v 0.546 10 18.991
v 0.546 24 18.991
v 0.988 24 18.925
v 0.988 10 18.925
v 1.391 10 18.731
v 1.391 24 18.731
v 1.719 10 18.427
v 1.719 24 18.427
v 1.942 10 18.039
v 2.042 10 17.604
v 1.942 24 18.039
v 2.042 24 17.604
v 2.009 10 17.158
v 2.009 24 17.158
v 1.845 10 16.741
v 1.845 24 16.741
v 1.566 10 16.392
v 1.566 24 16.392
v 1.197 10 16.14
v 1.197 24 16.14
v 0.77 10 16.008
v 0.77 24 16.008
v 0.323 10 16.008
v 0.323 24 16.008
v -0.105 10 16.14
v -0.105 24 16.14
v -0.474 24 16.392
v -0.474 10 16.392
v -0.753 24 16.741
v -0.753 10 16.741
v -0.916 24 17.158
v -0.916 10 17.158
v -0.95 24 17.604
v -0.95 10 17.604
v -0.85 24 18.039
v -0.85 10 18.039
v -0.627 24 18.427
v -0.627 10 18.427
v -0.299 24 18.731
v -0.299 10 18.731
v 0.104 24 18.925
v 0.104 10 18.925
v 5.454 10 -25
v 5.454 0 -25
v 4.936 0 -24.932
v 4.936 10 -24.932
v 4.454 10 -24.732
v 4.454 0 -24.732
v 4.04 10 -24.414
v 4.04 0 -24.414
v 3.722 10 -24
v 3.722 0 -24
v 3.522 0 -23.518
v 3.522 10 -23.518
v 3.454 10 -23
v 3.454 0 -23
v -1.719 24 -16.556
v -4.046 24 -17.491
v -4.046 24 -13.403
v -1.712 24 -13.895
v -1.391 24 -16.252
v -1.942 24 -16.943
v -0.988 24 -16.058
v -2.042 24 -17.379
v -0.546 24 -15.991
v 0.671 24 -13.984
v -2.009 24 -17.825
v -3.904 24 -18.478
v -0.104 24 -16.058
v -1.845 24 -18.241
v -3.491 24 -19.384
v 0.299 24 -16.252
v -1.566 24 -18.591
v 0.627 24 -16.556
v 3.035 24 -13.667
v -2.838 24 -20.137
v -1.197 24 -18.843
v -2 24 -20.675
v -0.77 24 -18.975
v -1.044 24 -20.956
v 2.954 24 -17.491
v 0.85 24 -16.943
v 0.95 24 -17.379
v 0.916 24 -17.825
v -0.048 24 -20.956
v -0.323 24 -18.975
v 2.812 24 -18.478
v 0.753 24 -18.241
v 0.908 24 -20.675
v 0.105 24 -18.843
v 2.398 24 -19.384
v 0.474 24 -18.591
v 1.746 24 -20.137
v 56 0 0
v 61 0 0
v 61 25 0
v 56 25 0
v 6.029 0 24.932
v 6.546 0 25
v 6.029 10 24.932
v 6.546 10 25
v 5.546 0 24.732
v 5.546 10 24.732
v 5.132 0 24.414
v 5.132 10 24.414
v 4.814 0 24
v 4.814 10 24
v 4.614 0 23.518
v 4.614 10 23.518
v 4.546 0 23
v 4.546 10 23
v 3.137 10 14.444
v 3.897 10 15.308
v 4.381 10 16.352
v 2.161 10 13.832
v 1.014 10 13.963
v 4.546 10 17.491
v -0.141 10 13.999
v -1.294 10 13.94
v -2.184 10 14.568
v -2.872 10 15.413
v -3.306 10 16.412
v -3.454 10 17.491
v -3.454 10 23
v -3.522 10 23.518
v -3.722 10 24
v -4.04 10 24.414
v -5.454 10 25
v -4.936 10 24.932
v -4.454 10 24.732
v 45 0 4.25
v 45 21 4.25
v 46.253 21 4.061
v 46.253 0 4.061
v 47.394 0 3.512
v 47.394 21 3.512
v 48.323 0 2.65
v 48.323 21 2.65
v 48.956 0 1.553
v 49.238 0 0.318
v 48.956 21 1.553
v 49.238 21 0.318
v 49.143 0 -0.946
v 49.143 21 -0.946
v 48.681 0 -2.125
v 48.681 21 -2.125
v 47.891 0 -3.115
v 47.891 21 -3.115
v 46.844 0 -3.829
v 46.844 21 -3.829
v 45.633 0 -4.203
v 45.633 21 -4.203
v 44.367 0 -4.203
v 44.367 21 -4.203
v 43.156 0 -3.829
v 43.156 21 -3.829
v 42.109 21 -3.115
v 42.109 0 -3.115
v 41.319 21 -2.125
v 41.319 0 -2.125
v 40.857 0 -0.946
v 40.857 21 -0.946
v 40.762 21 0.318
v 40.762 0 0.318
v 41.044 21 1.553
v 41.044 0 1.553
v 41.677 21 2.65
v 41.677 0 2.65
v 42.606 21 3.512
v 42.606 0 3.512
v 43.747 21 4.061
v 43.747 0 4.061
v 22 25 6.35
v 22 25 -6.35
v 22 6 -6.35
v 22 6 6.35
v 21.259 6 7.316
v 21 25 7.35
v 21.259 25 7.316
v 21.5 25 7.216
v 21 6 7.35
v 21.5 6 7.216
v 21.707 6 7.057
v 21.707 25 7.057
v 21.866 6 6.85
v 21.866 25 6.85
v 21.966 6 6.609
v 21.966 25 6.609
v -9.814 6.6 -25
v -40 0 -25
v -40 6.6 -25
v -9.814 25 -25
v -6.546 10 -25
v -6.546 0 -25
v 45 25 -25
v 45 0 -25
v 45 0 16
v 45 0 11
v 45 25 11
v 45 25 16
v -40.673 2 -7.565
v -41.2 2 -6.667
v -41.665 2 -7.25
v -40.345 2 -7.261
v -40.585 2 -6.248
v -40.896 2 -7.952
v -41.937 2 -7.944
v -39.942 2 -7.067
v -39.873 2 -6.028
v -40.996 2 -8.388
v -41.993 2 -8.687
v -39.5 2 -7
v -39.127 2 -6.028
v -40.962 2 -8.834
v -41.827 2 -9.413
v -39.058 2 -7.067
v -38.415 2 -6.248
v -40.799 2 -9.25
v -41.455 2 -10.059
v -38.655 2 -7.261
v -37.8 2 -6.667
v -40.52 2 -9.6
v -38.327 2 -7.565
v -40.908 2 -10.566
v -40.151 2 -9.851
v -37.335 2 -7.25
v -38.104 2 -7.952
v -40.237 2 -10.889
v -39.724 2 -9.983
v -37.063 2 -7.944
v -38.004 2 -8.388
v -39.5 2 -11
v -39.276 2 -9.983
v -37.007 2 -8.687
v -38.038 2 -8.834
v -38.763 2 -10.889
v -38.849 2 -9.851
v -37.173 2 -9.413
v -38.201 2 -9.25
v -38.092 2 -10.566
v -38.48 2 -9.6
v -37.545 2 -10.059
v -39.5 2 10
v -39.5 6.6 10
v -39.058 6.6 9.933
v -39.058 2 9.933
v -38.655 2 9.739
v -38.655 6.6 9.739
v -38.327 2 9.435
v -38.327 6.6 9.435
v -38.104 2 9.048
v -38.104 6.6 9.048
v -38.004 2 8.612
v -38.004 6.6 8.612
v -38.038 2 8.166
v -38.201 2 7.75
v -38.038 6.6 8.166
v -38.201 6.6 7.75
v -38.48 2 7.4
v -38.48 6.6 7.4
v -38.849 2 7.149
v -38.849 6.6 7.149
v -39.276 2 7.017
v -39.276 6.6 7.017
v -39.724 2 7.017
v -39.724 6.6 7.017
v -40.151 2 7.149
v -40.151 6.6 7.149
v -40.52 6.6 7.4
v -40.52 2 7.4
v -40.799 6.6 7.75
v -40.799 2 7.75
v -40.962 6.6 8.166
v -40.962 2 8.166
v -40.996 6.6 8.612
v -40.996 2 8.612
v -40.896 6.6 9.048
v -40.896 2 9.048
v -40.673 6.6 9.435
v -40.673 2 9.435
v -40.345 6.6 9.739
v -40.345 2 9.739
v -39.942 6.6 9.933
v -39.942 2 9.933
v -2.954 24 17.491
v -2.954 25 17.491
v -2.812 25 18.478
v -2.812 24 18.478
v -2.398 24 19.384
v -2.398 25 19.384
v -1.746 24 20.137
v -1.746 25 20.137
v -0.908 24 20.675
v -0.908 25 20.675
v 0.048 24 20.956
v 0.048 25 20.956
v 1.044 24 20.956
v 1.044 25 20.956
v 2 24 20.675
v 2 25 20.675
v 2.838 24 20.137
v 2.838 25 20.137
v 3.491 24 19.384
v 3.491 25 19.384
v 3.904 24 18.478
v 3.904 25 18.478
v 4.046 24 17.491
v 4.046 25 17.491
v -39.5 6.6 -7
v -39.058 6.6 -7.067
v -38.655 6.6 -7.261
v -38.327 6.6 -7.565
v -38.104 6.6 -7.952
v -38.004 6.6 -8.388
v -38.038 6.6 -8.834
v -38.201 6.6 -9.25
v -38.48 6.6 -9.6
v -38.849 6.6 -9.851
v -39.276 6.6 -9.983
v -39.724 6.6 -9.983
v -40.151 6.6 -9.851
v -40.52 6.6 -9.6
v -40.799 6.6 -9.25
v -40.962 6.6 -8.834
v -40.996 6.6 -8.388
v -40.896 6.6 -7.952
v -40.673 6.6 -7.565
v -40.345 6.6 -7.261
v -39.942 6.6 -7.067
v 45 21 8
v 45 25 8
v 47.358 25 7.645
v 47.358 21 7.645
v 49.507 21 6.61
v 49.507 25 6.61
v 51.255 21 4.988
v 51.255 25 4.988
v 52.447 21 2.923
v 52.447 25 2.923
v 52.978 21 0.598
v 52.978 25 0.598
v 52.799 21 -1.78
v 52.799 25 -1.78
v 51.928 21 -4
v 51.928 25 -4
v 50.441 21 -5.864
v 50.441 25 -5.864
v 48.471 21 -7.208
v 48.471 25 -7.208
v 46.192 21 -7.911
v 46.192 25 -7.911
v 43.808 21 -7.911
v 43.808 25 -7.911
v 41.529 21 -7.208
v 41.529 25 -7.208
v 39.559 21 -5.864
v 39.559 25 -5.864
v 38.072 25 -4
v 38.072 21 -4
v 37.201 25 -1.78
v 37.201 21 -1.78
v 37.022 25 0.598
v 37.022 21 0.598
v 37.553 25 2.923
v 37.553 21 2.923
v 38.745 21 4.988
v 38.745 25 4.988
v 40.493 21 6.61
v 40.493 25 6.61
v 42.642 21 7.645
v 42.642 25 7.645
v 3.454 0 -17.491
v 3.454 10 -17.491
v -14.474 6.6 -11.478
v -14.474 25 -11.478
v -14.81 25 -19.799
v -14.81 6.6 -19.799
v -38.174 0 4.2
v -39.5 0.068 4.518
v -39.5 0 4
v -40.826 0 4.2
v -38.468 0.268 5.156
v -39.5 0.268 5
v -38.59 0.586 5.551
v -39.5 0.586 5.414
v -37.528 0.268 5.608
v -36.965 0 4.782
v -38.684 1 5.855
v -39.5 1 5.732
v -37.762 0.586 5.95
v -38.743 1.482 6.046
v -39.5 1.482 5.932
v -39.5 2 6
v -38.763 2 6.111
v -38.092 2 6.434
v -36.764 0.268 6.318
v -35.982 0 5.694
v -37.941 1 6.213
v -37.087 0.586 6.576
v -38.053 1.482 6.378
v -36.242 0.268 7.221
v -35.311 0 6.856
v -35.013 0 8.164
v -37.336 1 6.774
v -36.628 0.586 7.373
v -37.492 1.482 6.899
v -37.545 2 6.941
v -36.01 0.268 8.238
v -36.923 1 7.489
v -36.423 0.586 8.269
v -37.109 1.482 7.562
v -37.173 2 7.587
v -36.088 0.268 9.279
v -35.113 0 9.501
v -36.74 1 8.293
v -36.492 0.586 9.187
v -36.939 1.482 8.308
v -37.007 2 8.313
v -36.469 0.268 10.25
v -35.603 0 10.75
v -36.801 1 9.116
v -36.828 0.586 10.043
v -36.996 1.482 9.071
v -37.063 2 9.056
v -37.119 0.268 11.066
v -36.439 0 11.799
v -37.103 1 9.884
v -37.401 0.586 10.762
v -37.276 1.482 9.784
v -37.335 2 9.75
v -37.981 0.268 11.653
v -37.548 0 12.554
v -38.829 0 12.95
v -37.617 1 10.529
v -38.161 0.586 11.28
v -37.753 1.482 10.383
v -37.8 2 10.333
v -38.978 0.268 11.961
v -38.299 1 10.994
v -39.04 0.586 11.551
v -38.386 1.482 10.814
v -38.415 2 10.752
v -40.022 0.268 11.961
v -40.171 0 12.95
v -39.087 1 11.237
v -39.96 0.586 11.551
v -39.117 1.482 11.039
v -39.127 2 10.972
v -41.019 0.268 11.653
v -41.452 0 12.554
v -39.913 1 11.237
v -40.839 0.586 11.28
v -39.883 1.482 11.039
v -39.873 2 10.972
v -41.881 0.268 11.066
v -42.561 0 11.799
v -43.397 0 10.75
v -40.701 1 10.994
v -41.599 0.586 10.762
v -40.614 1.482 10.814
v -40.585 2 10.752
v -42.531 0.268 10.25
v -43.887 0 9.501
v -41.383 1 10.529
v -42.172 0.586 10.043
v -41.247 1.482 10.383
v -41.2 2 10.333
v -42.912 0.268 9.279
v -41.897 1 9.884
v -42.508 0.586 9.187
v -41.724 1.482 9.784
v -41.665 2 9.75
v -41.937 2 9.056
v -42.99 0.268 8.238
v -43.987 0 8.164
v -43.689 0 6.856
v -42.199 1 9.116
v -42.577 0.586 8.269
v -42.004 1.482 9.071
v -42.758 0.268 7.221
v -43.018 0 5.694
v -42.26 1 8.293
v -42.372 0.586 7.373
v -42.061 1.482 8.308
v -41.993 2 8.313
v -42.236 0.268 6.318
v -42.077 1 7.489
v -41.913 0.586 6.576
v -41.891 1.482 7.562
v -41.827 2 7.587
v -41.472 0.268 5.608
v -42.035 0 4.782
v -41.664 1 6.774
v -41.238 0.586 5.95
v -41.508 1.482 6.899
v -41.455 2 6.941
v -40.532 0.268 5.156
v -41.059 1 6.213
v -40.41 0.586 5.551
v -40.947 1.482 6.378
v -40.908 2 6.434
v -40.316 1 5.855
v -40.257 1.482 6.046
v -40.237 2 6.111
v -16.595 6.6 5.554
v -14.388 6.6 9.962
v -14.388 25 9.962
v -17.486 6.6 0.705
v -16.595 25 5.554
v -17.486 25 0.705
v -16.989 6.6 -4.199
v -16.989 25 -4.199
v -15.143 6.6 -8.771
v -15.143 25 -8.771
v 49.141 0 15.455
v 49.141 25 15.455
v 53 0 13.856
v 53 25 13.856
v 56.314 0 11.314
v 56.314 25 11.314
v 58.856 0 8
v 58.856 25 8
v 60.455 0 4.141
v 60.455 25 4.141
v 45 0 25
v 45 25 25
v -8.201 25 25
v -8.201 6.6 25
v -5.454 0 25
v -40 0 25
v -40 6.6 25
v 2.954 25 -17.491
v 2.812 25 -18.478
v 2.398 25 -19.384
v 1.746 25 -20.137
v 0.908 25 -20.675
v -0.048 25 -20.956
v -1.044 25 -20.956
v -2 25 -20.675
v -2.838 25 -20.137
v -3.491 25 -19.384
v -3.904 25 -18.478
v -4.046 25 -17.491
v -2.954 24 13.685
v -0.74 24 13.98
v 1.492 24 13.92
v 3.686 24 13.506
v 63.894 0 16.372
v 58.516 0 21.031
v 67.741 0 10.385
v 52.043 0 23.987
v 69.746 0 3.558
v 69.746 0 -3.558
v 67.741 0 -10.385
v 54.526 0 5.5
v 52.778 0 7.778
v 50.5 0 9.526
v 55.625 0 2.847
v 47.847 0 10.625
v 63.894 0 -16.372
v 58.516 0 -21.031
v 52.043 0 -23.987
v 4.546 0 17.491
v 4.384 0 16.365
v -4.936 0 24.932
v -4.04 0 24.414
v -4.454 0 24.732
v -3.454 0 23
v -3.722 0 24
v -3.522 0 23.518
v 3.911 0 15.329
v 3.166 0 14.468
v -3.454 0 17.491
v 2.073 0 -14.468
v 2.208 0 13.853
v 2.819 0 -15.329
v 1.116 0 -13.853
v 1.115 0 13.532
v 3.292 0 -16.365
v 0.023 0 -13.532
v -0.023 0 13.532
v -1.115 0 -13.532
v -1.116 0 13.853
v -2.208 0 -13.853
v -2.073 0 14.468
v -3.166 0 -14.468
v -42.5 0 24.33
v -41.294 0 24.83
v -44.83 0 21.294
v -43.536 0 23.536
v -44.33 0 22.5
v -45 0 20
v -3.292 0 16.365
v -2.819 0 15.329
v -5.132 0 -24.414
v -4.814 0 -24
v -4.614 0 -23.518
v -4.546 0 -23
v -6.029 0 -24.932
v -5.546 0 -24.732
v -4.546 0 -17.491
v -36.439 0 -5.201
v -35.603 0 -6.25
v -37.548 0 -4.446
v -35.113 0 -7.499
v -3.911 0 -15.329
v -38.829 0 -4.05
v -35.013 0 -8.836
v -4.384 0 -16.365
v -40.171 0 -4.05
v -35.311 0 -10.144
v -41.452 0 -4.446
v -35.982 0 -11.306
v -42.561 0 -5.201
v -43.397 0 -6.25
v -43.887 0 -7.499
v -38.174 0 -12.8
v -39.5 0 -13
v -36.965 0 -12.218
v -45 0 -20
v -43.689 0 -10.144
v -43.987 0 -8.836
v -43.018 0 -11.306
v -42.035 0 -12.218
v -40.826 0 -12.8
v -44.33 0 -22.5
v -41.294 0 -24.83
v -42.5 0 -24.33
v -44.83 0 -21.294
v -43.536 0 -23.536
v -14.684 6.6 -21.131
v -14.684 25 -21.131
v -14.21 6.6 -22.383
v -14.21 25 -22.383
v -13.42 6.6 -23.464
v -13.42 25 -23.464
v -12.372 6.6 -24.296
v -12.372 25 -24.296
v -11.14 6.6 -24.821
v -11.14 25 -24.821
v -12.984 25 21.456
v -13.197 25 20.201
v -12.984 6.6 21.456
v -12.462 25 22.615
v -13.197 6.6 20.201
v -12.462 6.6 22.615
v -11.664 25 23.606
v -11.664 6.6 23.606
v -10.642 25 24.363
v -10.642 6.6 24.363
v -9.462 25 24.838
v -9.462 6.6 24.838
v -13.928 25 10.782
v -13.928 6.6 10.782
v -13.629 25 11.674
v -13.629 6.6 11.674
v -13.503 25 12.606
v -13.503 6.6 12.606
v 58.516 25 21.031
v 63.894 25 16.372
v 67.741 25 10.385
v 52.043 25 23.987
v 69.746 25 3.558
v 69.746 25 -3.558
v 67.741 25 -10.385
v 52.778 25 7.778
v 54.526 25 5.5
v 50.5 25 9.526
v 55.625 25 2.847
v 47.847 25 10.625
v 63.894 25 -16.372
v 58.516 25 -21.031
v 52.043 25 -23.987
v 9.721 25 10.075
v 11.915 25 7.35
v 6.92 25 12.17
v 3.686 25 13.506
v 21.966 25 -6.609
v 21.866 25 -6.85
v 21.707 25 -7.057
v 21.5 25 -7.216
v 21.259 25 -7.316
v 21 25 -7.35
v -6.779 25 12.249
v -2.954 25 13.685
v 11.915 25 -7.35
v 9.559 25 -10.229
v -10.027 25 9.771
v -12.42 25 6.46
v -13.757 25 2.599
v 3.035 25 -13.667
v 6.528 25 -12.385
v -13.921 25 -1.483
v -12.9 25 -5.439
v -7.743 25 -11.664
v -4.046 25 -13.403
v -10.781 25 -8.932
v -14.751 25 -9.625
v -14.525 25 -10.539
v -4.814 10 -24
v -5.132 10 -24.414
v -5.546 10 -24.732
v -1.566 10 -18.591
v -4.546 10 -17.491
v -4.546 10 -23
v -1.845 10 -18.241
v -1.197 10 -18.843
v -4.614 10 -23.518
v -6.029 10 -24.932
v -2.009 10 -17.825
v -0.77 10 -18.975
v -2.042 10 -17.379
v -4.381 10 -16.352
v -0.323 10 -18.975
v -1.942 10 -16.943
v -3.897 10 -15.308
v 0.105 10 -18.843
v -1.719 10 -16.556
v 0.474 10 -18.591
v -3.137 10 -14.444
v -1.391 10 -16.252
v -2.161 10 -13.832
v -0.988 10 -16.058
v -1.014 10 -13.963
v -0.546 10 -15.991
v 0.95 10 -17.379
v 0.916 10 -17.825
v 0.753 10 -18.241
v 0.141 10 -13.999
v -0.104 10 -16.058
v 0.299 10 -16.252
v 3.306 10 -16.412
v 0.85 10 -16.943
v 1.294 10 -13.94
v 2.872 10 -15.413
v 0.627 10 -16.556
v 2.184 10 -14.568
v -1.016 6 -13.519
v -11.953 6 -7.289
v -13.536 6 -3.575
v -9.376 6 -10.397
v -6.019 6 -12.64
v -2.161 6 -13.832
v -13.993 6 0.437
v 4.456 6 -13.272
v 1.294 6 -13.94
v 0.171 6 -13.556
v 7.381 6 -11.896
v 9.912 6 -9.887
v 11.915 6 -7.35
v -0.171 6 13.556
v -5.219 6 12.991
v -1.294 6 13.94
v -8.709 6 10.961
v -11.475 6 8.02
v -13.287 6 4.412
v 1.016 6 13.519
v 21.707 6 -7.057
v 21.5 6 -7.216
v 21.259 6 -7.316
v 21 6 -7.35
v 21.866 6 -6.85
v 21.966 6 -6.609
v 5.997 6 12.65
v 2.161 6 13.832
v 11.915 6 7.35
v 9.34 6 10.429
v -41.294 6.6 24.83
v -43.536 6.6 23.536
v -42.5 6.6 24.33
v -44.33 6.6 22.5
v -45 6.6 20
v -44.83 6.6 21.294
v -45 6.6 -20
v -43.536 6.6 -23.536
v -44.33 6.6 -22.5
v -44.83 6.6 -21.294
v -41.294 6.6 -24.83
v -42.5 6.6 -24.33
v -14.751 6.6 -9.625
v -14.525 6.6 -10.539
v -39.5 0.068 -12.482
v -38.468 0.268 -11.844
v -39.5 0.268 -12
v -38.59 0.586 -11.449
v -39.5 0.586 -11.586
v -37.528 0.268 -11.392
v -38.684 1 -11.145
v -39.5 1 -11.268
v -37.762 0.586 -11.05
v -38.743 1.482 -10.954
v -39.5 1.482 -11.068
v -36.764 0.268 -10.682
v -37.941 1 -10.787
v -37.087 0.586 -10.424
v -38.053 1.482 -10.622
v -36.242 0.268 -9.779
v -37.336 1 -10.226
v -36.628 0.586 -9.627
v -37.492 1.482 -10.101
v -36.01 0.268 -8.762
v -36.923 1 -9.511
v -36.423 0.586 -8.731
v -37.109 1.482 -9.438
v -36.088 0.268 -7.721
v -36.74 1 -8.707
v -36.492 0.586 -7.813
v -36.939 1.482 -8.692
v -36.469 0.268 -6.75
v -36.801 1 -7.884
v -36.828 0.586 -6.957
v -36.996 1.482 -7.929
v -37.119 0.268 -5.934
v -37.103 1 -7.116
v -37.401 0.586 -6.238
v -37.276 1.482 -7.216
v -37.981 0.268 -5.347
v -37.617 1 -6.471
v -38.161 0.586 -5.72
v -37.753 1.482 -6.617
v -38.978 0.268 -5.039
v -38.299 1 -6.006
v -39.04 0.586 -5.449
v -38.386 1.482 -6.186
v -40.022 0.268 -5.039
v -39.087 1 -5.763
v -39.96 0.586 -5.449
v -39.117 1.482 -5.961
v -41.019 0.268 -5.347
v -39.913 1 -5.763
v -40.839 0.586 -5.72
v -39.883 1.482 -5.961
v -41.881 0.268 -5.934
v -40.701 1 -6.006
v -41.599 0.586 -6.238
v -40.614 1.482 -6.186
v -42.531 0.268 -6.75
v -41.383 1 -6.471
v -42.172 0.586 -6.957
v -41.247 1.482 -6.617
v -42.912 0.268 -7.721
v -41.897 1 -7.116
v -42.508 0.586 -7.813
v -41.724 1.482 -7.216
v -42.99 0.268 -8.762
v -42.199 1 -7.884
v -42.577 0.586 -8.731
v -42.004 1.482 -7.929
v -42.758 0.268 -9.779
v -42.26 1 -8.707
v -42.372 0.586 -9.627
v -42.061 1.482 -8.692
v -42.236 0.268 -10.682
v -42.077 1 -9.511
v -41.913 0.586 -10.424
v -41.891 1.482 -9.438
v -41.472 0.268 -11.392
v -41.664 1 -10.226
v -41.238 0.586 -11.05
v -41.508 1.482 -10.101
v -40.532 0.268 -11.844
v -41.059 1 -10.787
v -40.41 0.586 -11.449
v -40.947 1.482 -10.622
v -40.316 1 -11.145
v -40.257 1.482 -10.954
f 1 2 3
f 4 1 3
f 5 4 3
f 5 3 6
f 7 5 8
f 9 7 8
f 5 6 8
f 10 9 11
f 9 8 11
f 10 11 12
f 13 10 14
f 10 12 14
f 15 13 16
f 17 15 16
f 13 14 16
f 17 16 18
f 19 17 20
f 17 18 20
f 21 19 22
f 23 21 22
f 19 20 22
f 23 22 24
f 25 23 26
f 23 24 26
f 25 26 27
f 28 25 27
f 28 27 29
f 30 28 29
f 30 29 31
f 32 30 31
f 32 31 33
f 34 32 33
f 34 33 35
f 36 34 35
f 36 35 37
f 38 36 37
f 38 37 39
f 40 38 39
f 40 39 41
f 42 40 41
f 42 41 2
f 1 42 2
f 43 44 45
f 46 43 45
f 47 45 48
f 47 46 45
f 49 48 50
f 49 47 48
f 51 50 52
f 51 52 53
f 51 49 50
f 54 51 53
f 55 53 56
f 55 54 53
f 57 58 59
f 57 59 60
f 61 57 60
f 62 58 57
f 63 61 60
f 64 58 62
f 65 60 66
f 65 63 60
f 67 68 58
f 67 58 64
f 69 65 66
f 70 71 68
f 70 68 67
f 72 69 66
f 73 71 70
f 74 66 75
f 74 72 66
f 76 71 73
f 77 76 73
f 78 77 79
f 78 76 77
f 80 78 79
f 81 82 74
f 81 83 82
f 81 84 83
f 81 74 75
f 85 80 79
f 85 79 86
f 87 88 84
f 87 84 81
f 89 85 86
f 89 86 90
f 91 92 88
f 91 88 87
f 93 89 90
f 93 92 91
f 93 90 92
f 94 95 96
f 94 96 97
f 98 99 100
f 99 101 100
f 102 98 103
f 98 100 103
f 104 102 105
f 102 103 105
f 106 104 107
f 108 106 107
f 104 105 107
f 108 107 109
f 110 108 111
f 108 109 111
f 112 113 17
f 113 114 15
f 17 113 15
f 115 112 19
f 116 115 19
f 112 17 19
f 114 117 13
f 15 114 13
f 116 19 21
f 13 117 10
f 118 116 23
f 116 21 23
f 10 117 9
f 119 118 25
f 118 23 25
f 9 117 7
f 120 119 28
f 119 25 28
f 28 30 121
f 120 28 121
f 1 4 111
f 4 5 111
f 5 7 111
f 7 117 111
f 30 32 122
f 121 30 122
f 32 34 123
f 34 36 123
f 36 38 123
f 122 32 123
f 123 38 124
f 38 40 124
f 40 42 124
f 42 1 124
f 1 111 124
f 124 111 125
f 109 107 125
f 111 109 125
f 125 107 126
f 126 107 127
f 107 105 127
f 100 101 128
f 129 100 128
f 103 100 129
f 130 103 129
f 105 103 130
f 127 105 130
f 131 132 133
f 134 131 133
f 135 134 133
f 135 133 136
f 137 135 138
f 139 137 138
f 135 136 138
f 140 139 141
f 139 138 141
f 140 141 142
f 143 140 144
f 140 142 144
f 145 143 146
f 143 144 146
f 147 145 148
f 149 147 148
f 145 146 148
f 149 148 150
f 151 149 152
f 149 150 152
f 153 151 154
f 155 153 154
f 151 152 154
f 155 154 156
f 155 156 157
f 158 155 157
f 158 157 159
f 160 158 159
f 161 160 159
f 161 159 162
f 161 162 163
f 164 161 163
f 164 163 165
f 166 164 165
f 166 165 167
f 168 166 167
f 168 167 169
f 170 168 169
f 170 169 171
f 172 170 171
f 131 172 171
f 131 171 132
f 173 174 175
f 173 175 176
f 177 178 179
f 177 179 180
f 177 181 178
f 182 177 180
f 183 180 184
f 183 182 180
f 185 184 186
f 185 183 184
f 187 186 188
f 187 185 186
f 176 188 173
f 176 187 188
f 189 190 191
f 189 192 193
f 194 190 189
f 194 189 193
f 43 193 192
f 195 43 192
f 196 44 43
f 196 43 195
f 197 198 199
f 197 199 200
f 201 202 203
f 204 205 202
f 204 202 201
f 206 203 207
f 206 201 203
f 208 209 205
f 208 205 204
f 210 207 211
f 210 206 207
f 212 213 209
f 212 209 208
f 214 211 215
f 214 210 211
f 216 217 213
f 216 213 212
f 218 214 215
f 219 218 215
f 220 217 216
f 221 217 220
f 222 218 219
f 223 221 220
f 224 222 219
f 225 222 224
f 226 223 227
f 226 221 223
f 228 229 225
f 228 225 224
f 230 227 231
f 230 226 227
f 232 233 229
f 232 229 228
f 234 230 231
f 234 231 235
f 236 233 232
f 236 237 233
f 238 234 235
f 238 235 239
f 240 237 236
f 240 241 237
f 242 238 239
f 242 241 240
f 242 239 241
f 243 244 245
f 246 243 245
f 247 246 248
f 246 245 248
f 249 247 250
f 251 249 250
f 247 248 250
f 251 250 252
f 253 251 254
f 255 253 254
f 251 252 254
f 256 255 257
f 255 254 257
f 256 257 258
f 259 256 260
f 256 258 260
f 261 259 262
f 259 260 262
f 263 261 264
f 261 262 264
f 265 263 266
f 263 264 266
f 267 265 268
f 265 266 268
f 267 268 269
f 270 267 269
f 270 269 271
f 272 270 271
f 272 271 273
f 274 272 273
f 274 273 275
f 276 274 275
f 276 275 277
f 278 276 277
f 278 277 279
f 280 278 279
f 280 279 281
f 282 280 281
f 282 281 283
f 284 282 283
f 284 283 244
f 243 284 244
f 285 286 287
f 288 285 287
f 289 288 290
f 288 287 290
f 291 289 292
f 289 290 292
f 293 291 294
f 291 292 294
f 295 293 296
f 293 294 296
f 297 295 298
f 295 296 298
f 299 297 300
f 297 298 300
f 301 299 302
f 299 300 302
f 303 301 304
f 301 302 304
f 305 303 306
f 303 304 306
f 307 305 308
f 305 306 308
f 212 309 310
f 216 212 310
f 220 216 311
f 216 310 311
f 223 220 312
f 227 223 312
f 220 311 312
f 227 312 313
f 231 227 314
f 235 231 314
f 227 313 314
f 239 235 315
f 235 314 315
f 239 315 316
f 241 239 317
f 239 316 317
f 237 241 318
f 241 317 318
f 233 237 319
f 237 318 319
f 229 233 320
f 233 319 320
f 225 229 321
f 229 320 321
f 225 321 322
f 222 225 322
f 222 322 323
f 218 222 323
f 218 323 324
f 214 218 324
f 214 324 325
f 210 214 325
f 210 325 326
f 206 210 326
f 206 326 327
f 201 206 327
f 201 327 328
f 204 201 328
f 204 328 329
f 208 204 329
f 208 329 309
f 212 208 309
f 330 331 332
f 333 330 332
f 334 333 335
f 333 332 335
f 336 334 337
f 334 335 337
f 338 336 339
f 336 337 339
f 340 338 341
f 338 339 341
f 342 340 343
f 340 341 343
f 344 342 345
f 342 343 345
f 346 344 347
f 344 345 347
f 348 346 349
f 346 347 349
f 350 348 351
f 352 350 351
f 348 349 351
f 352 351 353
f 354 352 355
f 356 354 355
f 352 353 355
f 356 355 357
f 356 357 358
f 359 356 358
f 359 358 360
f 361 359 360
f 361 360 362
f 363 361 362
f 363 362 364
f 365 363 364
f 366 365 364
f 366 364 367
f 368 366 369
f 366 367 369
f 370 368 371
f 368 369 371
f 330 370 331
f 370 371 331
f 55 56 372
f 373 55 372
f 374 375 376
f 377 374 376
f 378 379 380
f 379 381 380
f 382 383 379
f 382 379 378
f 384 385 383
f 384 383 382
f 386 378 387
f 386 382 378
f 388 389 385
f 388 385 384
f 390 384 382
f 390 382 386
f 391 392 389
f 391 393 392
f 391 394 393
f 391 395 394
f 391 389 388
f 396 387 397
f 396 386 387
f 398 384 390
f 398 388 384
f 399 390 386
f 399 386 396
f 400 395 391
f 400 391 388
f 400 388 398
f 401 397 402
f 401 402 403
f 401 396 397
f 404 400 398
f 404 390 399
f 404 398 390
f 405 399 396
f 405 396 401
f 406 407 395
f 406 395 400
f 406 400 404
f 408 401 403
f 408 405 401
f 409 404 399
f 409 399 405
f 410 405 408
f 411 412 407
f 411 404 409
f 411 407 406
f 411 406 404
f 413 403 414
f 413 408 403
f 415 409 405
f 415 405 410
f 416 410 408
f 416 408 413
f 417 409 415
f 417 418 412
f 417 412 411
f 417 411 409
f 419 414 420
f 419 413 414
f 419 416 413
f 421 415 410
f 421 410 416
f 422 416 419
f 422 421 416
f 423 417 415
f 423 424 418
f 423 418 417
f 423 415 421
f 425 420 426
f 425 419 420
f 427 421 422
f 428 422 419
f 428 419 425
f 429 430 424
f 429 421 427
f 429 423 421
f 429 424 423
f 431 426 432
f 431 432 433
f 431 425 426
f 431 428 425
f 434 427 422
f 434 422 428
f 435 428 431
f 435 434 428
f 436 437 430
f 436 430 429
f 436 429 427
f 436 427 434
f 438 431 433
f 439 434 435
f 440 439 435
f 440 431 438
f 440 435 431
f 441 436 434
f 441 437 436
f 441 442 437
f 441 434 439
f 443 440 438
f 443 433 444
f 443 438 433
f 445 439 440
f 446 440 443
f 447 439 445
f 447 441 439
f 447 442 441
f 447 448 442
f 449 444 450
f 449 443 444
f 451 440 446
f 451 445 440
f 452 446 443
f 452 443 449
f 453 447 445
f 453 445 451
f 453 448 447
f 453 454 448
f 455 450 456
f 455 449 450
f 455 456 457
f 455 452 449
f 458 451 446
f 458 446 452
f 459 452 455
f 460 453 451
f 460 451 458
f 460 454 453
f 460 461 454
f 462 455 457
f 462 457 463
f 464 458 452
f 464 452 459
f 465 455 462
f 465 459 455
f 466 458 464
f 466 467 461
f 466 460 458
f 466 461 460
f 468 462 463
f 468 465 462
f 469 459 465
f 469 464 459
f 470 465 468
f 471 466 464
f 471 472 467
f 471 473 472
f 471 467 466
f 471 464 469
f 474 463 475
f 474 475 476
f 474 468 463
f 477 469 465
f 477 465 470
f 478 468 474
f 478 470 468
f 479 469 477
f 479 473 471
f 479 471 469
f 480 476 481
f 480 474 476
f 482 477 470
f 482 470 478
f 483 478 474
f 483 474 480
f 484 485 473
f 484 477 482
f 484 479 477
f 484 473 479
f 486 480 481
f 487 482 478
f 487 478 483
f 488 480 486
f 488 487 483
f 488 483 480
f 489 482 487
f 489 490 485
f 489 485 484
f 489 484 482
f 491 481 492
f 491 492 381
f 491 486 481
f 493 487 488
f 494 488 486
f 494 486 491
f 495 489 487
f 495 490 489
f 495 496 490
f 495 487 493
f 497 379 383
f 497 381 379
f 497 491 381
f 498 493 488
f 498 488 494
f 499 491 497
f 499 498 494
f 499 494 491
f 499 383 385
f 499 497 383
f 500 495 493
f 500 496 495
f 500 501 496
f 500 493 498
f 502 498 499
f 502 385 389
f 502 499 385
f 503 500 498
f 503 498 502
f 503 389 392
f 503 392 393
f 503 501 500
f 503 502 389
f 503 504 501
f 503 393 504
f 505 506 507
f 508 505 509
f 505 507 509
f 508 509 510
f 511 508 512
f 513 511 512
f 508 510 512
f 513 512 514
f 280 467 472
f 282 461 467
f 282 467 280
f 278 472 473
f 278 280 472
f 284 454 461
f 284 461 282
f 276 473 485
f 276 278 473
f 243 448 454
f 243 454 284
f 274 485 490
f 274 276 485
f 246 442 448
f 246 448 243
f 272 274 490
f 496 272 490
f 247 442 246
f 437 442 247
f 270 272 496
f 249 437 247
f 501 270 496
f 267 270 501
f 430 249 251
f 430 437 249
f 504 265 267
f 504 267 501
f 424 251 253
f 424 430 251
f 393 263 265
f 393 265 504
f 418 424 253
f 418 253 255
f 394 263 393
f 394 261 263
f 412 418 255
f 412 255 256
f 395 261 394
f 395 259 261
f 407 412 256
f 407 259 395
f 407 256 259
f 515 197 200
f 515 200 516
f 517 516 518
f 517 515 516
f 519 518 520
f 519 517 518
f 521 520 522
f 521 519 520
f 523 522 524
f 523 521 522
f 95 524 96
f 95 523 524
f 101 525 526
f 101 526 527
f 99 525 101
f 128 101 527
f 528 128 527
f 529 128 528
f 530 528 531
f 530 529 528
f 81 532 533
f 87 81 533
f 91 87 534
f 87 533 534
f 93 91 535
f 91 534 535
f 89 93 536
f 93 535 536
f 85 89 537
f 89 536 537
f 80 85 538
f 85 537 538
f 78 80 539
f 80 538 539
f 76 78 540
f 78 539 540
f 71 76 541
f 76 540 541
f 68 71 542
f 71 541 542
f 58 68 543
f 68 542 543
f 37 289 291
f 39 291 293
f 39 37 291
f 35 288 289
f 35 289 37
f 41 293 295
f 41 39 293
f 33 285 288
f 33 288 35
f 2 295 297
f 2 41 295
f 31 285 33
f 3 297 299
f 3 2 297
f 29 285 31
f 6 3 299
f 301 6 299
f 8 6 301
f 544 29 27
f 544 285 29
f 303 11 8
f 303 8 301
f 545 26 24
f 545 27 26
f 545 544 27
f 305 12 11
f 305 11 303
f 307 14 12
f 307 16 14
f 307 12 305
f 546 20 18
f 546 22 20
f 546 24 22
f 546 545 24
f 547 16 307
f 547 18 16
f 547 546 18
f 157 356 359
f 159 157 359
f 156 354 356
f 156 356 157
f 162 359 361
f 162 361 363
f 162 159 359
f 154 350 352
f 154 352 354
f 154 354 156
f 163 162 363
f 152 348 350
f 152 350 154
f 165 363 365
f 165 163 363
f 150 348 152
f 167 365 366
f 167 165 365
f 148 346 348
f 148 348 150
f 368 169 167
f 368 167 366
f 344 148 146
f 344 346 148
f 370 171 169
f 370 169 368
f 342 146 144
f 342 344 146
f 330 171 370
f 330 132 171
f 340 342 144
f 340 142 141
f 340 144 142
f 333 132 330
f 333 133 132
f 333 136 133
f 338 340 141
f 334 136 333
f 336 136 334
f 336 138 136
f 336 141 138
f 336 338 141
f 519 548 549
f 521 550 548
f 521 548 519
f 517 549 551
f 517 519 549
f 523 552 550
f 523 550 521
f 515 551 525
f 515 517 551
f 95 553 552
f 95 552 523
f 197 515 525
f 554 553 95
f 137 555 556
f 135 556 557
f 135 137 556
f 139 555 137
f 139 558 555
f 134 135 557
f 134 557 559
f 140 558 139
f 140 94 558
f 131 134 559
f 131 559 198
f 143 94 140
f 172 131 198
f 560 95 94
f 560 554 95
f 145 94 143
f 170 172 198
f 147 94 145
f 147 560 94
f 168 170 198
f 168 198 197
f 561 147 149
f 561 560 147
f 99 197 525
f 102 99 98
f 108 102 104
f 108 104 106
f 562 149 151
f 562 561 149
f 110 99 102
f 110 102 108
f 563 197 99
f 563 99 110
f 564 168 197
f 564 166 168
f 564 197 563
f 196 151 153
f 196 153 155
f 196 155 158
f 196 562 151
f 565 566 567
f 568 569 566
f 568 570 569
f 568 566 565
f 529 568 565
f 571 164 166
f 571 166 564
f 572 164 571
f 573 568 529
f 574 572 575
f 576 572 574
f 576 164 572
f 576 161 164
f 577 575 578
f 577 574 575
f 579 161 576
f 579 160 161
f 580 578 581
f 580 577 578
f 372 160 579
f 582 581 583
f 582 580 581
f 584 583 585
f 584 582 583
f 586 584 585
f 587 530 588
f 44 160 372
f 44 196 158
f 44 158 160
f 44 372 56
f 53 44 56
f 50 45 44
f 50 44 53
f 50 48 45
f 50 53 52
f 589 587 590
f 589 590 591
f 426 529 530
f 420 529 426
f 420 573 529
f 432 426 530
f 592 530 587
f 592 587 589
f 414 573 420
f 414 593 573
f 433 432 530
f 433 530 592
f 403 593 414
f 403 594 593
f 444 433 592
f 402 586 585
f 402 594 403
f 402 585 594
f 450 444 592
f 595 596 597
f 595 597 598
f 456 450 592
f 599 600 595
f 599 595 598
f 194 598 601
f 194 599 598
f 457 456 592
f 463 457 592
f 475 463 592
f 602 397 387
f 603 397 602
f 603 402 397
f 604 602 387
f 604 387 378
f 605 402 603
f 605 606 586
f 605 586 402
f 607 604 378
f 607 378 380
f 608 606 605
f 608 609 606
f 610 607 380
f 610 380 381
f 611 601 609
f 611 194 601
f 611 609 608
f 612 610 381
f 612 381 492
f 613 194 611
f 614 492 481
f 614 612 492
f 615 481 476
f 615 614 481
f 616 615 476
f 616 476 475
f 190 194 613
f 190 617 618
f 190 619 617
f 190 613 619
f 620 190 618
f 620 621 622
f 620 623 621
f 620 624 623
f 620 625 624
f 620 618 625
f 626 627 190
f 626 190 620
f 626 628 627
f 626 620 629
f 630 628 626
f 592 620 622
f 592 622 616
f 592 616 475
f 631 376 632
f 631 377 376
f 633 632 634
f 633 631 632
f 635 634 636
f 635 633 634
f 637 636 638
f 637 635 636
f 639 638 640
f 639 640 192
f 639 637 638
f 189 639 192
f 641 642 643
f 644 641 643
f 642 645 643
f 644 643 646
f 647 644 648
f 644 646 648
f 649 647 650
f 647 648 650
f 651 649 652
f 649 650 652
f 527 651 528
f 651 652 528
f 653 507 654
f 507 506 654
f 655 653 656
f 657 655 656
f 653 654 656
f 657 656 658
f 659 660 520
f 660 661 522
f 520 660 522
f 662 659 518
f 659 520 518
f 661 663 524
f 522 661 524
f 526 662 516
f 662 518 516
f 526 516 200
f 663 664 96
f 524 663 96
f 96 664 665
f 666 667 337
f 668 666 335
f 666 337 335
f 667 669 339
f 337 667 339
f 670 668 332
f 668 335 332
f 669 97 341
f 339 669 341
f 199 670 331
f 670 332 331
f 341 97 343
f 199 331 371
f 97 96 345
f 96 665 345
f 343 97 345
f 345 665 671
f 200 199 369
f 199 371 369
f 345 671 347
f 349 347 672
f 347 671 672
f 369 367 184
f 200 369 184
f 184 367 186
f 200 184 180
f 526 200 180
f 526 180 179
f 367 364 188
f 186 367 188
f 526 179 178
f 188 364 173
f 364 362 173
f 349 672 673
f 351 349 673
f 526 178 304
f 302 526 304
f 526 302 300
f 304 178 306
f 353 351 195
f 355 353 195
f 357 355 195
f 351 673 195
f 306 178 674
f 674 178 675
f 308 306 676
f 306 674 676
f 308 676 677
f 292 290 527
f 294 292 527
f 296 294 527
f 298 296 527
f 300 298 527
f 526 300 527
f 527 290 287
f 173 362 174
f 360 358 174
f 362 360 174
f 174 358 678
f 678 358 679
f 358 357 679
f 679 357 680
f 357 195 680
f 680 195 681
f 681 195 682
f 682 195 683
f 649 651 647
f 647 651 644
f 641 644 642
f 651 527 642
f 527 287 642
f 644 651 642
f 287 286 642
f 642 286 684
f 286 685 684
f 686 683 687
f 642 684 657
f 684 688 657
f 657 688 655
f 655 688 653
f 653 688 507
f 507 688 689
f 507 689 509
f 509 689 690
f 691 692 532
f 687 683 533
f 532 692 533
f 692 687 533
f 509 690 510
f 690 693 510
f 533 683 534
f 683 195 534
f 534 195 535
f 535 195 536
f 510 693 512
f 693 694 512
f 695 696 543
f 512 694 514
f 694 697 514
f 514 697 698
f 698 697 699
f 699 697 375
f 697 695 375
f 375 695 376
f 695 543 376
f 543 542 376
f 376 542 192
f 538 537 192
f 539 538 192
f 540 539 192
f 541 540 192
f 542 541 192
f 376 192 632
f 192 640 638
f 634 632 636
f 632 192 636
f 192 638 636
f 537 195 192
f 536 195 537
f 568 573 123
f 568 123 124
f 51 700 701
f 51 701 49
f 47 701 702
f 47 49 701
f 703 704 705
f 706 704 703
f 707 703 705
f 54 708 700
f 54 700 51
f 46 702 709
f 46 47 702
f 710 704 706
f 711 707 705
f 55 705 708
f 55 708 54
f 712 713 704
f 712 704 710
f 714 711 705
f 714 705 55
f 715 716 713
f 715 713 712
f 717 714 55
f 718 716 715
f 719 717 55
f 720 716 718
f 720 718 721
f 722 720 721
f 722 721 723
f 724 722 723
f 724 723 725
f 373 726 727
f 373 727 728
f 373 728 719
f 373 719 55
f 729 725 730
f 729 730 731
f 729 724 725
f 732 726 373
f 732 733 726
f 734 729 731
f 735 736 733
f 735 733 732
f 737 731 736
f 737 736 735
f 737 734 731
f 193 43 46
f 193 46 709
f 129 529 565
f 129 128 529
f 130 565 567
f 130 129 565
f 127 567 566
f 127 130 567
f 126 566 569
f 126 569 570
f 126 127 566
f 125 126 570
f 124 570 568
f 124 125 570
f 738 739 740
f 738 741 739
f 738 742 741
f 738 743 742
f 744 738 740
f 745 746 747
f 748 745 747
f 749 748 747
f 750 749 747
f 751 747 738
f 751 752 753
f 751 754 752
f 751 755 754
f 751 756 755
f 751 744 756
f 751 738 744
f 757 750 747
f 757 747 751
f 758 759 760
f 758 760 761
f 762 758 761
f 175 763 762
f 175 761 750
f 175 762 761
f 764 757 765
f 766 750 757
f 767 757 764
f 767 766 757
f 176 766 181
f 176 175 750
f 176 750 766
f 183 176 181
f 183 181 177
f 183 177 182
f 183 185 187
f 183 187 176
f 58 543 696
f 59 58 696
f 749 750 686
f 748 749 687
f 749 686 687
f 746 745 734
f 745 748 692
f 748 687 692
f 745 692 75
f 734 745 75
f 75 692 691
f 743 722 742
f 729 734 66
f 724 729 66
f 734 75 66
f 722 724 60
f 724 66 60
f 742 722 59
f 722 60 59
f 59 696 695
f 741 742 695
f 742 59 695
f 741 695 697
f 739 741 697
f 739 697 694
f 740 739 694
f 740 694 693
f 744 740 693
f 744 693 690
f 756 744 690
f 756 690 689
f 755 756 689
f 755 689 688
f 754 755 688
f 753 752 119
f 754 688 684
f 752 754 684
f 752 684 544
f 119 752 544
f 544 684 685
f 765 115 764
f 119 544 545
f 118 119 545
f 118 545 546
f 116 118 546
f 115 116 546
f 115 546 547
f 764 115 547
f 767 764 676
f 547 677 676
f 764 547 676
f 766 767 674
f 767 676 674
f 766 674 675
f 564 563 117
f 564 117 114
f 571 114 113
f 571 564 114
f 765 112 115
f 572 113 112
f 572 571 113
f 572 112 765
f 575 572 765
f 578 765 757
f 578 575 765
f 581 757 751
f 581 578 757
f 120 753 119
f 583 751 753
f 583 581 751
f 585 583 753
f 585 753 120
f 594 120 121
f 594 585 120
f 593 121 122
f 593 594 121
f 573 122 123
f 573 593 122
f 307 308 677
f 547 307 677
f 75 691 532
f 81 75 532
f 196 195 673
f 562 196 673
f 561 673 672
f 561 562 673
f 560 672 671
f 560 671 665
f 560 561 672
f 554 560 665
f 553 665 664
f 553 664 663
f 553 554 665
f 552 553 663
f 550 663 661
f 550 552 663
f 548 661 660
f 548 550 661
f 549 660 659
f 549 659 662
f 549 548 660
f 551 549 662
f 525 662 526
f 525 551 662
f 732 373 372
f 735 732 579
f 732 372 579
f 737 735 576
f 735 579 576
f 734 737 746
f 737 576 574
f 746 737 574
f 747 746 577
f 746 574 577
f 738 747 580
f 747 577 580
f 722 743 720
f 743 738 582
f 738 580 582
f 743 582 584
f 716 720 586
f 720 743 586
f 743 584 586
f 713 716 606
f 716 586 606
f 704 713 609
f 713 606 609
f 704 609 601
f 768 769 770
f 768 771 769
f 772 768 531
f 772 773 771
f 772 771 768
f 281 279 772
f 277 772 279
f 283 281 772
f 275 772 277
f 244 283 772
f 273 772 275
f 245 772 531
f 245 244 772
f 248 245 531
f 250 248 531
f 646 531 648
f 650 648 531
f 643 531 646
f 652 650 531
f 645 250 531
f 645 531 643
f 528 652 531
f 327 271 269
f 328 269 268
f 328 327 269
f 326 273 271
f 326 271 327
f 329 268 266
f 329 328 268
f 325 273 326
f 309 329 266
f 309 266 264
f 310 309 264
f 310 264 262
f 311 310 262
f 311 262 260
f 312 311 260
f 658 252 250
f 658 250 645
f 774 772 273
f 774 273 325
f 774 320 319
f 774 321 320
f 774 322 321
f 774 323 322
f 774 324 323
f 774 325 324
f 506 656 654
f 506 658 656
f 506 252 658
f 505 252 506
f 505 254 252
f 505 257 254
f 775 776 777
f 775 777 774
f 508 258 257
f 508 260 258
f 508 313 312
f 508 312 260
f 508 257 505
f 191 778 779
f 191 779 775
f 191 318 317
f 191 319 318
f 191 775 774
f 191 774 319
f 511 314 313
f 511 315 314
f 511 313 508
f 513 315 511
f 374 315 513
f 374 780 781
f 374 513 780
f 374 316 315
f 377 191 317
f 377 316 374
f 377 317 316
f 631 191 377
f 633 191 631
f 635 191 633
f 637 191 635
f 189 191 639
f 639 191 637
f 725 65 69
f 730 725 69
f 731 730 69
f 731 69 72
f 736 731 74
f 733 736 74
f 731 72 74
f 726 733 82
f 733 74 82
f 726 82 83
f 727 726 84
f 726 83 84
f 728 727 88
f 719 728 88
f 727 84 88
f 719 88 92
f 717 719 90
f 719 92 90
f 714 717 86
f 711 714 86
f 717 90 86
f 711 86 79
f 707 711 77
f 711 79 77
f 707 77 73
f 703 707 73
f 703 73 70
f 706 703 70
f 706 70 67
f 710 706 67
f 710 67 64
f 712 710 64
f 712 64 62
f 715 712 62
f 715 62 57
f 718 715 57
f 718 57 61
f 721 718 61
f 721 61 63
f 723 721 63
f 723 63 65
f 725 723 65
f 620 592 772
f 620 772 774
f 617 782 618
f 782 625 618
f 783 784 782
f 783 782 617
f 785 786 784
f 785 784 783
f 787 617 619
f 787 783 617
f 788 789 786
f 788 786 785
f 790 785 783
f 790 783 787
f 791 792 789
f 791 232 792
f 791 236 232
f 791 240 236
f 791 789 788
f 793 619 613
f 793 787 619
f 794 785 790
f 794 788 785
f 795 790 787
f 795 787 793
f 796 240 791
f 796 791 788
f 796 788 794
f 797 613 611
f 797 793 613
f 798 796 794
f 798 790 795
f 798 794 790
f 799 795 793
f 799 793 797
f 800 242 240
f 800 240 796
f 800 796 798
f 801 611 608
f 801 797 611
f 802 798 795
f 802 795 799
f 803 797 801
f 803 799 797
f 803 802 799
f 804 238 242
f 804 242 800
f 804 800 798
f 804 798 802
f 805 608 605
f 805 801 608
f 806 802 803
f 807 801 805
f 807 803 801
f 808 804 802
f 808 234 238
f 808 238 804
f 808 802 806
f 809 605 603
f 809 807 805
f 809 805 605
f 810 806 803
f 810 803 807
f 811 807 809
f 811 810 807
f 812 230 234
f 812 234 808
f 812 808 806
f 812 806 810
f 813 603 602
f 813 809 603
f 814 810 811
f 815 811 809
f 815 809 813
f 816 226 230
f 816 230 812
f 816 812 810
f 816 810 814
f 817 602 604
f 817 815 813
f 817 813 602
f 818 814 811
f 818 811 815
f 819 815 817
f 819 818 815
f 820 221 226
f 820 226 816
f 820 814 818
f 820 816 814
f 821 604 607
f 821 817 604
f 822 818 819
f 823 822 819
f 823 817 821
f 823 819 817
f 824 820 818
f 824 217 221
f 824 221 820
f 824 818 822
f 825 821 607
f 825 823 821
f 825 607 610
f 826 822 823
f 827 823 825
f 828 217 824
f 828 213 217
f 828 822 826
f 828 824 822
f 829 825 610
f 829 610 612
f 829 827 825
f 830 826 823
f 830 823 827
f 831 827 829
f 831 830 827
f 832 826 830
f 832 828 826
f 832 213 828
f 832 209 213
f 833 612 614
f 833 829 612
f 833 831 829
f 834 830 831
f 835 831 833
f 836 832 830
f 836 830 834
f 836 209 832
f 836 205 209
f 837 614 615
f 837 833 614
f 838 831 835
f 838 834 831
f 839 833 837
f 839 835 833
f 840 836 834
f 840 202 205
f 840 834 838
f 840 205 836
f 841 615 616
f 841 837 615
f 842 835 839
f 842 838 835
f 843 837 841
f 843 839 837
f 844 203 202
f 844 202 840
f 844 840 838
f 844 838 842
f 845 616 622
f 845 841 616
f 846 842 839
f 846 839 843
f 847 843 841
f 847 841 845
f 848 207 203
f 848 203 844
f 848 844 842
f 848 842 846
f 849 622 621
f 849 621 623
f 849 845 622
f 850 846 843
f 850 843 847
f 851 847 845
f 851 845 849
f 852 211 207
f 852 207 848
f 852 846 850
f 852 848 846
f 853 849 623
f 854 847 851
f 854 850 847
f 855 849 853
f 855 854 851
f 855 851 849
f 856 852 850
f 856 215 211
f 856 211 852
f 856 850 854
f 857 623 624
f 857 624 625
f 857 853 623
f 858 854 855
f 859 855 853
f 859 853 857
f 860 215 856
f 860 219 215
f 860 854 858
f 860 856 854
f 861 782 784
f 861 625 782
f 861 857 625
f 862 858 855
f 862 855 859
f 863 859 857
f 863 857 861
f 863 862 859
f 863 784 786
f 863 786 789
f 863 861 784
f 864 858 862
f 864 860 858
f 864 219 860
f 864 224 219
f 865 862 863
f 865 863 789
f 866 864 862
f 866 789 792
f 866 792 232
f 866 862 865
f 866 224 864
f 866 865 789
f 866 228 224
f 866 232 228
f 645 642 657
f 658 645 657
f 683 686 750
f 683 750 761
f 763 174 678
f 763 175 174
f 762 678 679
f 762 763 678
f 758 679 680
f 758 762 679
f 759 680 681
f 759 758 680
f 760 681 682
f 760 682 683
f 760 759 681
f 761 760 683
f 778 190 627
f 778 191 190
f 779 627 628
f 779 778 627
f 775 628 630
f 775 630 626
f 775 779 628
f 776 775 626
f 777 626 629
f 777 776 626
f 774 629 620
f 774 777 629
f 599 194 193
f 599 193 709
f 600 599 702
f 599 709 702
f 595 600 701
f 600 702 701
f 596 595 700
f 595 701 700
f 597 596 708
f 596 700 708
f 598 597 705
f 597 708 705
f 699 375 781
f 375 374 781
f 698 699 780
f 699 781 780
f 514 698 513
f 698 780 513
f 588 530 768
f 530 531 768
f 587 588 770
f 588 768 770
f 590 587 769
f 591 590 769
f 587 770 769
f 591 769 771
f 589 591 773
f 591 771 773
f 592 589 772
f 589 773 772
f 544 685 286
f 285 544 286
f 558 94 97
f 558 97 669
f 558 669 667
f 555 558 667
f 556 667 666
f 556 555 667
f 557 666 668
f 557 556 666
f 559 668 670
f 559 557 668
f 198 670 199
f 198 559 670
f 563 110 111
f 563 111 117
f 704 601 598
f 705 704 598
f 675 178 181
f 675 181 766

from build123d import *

# Parameters (mm, degrees)
BOSS_EXTRUDE1_DEPTH = 25
SKETCH2_R           = 14
CUT_EXTRUDE1_DEPTH  = 19
CUT_EXTRUDE2_DEPTH  = 1
SKETCH4_R           = 1.5
CUT_EXTRUDE3_DEPTH  = 79.108898341
SKETCH5_R           = 1.5
CUT_EXTRUDE4_DEPTH  = 79.108898341
CUT_EXTRUDE7_DEPTH  = 19
FILLET1_R           = 1
CUT_EXTRUDE8_DEPTH  = 18.4
FILLET2_R           = 5
SKETCH8_R           = 1.5
CUT_EXTRUDE9_DEPTH  = 77.573885888
SKETCH9_R           = 2.5
CUT_EXTRUDE10_DEPTH = 2
FILLET3_R           = 2
CUT_EXTRUDE11_DEPTH = 10
FILLET4_R           = 2
SKETCH11_R          = 8
CUT_EXTRUDE12_DEPTH = 4
SKETCH12_R          = 4.25
CUT_EXTRUDE13_DEPTH = 78.239886096
CUT_EXTRUDE16_DEPTH = 25


with BuildPart() as part:
    # Sketch1 → Boss-Extrude1 (new body)
    with BuildSketch(Plane(origin=(0, 0, 0), x_dir=(1, 0, 0), z_dir=(0, 1, 0))):
        with BuildLine():
            Line((-45, 25), (45, 25))
            ThreePointArc((45, 25), (70, 0), (45, -25))
            Line((45, -25), (-45, -25))
            Line((-45, -25), (-45, 25))
        make_face()
    extrude(amount=BOSS_EXTRUDE1_DEPTH)

    # Sketch2 → Cut-Extrude1 (cut)
    with BuildSketch(Plane(origin=(0, 25, 0), x_dir=(1, 0, 0), z_dir=(0, 1, 0))):
        with Locations(Location((0, 0, 0), (0, 0, 270))):
            Circle(SKETCH2_R)
    extrude(amount=-CUT_EXTRUDE1_DEPTH, mode=Mode.SUBTRACT)

    # Sketch3 → Cut-Extrude2 (cut)
    with BuildSketch(Plane(origin=(0, 25, 0), x_dir=(1, 0, 0), z_dir=(0, 1, 0))):
        with BuildLine():
            ThreePointArc((2.953843371, 17.491475436), (-0.546156629, 20.991475436), (-4.046156629, 17.491475436))
            Line((-4.046156629, 17.491475436), (-4.046156629, 13.402560074))
            ThreePointArc((-4.046156629, 13.402560074), (-0.522473122, 13.990247383), (3.035229041, 13.667018134))
            Line((3.035229041, 13.667018134), (2.953843371, 17.491475436))
        make_face()
        with BuildLine():
            Line((-2.953843371, -13.684838667), (-2.953843371, -17.491475436))
            ThreePointArc((-2.953843371, -17.491475436), (0.546156629, -20.991475436), (4.046156629, -17.491475436))
            Line((4.046156629, -17.491475436), (3.686093385, -13.506025158))
            ThreePointArc((3.686093385, -13.506025158), (0.376883388, -13.994926185), (-2.953843371, -13.684838667))
        make_face()
    extrude(amount=-CUT_EXTRUDE2_DEPTH, mode=Mode.SUBTRACT)

    # Sketch4 → Cut-Extrude3 (cut, through all)
    with BuildSketch(Plane(origin=(0, 24, 0), x_dir=(1, 0, 0), z_dir=(0, 1, 0))):
        with Locations(Location((-0.546156629, 17.491475436, 0), (0, 0, 270))):
            Circle(SKETCH4_R)
    extrude(amount=-CUT_EXTRUDE3_DEPTH, mode=Mode.SUBTRACT)

    # Sketch5 → Cut-Extrude4 (cut, through all)
    with BuildSketch(Plane(origin=(0, 24, 0), x_dir=(1, 0, 0), z_dir=(0, 1, 0))):
        with Locations(Location((0.546156629, -17.491475436, 0), (0, 0, 270))):
            Circle(SKETCH5_R)
    extrude(amount=-CUT_EXTRUDE4_DEPTH, mode=Mode.SUBTRACT)

    # Sketch6 → Cut-Extrude7 (cut)
    with BuildSketch(Plane(origin=(0, 25, 0), x_dir=(1, 0, 0), z_dir=(0, 1, 0))):
        with BuildLine():
            Line((22, 7.35), (22, -7.35))
            Line((22, -7.35), (11.915431171, -7.35))
            Line((11.915431171, -7.35), (11.920287143, -7.342121929))
            ThreePointArc((11.920287143, -7.342121929), (13.999999235, 0.004627215), (11.915431171, 7.35))
            Line((11.915431171, 7.35), (22, 7.35))
        make_face()
    extrude(amount=-CUT_EXTRUDE7_DEPTH, mode=Mode.SUBTRACT)

    # Fillet1
    fillet1_edges = [part.edges().sort_by_distance(p)[0] for p in [
        (22, 15.5, 7.35),
        (22, 15.5, -7.35),
    ]]
    fillet(fillet1_edges, radius=FILLET1_R)

    # Sketch7 → Cut-Extrude8 (cut)
    with BuildSketch(Plane(origin=(0, 25, 0), x_dir=(1, 0, 0), z_dir=(0, 1, 0))):
        with BuildLine():
            Line((-14.411704874, 9.927374408), (-15.019516237, 25))
            Line((-15.019516237, 25), (-45, 25))
            Line((-45, 25), (-45, -25))
            Line((-45, -25), (-13.003240573, -25))
            Line((-13.003240573, -25), (-13.565556796, -11.055571845))
            ThreePointArc((-13.565556796, -11.055571845), (-17.485788544, -0.705123398), (-14.411704874, 9.927374408))
        make_face()
    extrude(amount=-CUT_EXTRUDE8_DEPTH, mode=Mode.SUBTRACT)

    # Fillet2
    fillet2_edges = [part.edges().sort_by_distance(p)[0] for p in [
        (-45, 3.3, 25),
        (-45, 3.3, -25),
        (-14.411704874, 15.8, -9.927374408),
        (-13.565556796, 15.8, 11.055571845),
        (-13.003240573, 15.8, 25),
        (-15.019516237, 15.8, -25),
    ]]
    fillet(fillet2_edges, radius=FILLET2_R)

    # Sketch8 → Cut-Extrude9 (cut, through all)
    with BuildSketch(Plane(origin=(0, 6.6, 0), x_dir=(1, 0, 0), z_dir=(0, 1, 0))):
        with Locations(Location((-39.5, 8.5, 0), (0, 0, 270))):
            Circle(SKETCH8_R)
        with Locations(Location((-39.5, -8.5, 0), (0, 0, 270))):
            Circle(SKETCH8_R)
    extrude(amount=-CUT_EXTRUDE9_DEPTH, mode=Mode.SUBTRACT)

    # Sketch9 → Cut-Extrude10 (cut)
    with BuildSketch(Plane.XZ):
        with Locations(Location((-39.5, 8.5, 0), (0, 0, 270))):
            Circle(SKETCH9_R)
        with Locations(Location((-39.5, -8.5, 0), (0, 0, 270))):
            Circle(SKETCH9_R)
    extrude(amount=-CUT_EXTRUDE10_DEPTH, mode=Mode.SUBTRACT)

    # Fillet3
    fillet3_edges = [part.edges().sort_by_distance(p)[0] for p in [
        (-39.5, 0, 11),
        (-39.5, 0, -6),
    ]]
    fillet(fillet3_edges, radius=FILLET3_R - 0.0001)  # a hair under: the kernel refuses the full size

    # Sketch10 → Cut-Extrude11 (cut)
    with BuildSketch(Plane.XZ):
        with BuildLine():
            Line((-3.453843371, 17.491475436), (-3.453843371, 25))
            Line((-3.453843371, 25), (4.546156629, 25))
            Line((4.546156629, 25), (4.546156629, 17.491475436))
            ThreePointArc((4.546156629, 17.491475436), (0.546156629, 13.491475436), (-3.453843371, 17.491475436))
        make_face()
        with BuildLine():
            Line((-4.546156629, -17.491475436), (-4.546156629, -25))
            Line((-4.546156629, -25), (3.453843371, -25))
            Line((3.453843371, -25), (3.453843371, -17.491475436))
            ThreePointArc((3.453843371, -17.491475436), (-0.546156629, -13.491475436), (-4.546156629, -17.491475436))
        make_face()
    extrude(amount=-CUT_EXTRUDE11_DEPTH, mode=Mode.SUBTRACT)

    # Fillet4
    fillet4_edges = [part.edges().sort_by_distance(p)[0] for p in [
        (-3.453843371, 5, 25),
        (4.546156629, 5, 25),
        (3.453843371, 5, -25),
        (-4.546156629, 5, -25),
    ]]
    fillet(fillet4_edges, radius=FILLET4_R)

    # Sketch11 → Cut-Extrude12 (cut)
    with BuildSketch(Plane(origin=(0, 25, 0), x_dir=(1, 0, 0), z_dir=(0, 1, 0))):
        with Locations(Location((45, 0, 0), (0, 0, 270))):
            Circle(SKETCH11_R)
    extrude(amount=-CUT_EXTRUDE12_DEPTH, mode=Mode.SUBTRACT)

    # Sketch12 → Cut-Extrude13 (cut, through all)
    with BuildSketch(Plane(origin=(0, 21, 0), x_dir=(1, 0, 0), z_dir=(0, 1, 0))):
        with Locations(Location((45, 0, 0), (0, 0, 270))):
            Circle(SKETCH12_R)
    extrude(amount=-CUT_EXTRUDE13_DEPTH, mode=Mode.SUBTRACT)

    # Sketch19 → Cut-Extrude16 (cut)
    with BuildSketch(Plane.XZ):
        with BuildLine():
            Line((45, 11), (45, 16))
            ThreePointArc((45, 16), (56.313708499, 11.313708499), (61, 0))
            Line((61, 0), (56, 0))
            ThreePointArc((56, 0), (52.778174593, 7.778174593), (45, 11))
        make_face()
    extrude(amount=-CUT_EXTRUDE16_DEPTH, mode=Mode.SUBTRACT)


solid = part.part
